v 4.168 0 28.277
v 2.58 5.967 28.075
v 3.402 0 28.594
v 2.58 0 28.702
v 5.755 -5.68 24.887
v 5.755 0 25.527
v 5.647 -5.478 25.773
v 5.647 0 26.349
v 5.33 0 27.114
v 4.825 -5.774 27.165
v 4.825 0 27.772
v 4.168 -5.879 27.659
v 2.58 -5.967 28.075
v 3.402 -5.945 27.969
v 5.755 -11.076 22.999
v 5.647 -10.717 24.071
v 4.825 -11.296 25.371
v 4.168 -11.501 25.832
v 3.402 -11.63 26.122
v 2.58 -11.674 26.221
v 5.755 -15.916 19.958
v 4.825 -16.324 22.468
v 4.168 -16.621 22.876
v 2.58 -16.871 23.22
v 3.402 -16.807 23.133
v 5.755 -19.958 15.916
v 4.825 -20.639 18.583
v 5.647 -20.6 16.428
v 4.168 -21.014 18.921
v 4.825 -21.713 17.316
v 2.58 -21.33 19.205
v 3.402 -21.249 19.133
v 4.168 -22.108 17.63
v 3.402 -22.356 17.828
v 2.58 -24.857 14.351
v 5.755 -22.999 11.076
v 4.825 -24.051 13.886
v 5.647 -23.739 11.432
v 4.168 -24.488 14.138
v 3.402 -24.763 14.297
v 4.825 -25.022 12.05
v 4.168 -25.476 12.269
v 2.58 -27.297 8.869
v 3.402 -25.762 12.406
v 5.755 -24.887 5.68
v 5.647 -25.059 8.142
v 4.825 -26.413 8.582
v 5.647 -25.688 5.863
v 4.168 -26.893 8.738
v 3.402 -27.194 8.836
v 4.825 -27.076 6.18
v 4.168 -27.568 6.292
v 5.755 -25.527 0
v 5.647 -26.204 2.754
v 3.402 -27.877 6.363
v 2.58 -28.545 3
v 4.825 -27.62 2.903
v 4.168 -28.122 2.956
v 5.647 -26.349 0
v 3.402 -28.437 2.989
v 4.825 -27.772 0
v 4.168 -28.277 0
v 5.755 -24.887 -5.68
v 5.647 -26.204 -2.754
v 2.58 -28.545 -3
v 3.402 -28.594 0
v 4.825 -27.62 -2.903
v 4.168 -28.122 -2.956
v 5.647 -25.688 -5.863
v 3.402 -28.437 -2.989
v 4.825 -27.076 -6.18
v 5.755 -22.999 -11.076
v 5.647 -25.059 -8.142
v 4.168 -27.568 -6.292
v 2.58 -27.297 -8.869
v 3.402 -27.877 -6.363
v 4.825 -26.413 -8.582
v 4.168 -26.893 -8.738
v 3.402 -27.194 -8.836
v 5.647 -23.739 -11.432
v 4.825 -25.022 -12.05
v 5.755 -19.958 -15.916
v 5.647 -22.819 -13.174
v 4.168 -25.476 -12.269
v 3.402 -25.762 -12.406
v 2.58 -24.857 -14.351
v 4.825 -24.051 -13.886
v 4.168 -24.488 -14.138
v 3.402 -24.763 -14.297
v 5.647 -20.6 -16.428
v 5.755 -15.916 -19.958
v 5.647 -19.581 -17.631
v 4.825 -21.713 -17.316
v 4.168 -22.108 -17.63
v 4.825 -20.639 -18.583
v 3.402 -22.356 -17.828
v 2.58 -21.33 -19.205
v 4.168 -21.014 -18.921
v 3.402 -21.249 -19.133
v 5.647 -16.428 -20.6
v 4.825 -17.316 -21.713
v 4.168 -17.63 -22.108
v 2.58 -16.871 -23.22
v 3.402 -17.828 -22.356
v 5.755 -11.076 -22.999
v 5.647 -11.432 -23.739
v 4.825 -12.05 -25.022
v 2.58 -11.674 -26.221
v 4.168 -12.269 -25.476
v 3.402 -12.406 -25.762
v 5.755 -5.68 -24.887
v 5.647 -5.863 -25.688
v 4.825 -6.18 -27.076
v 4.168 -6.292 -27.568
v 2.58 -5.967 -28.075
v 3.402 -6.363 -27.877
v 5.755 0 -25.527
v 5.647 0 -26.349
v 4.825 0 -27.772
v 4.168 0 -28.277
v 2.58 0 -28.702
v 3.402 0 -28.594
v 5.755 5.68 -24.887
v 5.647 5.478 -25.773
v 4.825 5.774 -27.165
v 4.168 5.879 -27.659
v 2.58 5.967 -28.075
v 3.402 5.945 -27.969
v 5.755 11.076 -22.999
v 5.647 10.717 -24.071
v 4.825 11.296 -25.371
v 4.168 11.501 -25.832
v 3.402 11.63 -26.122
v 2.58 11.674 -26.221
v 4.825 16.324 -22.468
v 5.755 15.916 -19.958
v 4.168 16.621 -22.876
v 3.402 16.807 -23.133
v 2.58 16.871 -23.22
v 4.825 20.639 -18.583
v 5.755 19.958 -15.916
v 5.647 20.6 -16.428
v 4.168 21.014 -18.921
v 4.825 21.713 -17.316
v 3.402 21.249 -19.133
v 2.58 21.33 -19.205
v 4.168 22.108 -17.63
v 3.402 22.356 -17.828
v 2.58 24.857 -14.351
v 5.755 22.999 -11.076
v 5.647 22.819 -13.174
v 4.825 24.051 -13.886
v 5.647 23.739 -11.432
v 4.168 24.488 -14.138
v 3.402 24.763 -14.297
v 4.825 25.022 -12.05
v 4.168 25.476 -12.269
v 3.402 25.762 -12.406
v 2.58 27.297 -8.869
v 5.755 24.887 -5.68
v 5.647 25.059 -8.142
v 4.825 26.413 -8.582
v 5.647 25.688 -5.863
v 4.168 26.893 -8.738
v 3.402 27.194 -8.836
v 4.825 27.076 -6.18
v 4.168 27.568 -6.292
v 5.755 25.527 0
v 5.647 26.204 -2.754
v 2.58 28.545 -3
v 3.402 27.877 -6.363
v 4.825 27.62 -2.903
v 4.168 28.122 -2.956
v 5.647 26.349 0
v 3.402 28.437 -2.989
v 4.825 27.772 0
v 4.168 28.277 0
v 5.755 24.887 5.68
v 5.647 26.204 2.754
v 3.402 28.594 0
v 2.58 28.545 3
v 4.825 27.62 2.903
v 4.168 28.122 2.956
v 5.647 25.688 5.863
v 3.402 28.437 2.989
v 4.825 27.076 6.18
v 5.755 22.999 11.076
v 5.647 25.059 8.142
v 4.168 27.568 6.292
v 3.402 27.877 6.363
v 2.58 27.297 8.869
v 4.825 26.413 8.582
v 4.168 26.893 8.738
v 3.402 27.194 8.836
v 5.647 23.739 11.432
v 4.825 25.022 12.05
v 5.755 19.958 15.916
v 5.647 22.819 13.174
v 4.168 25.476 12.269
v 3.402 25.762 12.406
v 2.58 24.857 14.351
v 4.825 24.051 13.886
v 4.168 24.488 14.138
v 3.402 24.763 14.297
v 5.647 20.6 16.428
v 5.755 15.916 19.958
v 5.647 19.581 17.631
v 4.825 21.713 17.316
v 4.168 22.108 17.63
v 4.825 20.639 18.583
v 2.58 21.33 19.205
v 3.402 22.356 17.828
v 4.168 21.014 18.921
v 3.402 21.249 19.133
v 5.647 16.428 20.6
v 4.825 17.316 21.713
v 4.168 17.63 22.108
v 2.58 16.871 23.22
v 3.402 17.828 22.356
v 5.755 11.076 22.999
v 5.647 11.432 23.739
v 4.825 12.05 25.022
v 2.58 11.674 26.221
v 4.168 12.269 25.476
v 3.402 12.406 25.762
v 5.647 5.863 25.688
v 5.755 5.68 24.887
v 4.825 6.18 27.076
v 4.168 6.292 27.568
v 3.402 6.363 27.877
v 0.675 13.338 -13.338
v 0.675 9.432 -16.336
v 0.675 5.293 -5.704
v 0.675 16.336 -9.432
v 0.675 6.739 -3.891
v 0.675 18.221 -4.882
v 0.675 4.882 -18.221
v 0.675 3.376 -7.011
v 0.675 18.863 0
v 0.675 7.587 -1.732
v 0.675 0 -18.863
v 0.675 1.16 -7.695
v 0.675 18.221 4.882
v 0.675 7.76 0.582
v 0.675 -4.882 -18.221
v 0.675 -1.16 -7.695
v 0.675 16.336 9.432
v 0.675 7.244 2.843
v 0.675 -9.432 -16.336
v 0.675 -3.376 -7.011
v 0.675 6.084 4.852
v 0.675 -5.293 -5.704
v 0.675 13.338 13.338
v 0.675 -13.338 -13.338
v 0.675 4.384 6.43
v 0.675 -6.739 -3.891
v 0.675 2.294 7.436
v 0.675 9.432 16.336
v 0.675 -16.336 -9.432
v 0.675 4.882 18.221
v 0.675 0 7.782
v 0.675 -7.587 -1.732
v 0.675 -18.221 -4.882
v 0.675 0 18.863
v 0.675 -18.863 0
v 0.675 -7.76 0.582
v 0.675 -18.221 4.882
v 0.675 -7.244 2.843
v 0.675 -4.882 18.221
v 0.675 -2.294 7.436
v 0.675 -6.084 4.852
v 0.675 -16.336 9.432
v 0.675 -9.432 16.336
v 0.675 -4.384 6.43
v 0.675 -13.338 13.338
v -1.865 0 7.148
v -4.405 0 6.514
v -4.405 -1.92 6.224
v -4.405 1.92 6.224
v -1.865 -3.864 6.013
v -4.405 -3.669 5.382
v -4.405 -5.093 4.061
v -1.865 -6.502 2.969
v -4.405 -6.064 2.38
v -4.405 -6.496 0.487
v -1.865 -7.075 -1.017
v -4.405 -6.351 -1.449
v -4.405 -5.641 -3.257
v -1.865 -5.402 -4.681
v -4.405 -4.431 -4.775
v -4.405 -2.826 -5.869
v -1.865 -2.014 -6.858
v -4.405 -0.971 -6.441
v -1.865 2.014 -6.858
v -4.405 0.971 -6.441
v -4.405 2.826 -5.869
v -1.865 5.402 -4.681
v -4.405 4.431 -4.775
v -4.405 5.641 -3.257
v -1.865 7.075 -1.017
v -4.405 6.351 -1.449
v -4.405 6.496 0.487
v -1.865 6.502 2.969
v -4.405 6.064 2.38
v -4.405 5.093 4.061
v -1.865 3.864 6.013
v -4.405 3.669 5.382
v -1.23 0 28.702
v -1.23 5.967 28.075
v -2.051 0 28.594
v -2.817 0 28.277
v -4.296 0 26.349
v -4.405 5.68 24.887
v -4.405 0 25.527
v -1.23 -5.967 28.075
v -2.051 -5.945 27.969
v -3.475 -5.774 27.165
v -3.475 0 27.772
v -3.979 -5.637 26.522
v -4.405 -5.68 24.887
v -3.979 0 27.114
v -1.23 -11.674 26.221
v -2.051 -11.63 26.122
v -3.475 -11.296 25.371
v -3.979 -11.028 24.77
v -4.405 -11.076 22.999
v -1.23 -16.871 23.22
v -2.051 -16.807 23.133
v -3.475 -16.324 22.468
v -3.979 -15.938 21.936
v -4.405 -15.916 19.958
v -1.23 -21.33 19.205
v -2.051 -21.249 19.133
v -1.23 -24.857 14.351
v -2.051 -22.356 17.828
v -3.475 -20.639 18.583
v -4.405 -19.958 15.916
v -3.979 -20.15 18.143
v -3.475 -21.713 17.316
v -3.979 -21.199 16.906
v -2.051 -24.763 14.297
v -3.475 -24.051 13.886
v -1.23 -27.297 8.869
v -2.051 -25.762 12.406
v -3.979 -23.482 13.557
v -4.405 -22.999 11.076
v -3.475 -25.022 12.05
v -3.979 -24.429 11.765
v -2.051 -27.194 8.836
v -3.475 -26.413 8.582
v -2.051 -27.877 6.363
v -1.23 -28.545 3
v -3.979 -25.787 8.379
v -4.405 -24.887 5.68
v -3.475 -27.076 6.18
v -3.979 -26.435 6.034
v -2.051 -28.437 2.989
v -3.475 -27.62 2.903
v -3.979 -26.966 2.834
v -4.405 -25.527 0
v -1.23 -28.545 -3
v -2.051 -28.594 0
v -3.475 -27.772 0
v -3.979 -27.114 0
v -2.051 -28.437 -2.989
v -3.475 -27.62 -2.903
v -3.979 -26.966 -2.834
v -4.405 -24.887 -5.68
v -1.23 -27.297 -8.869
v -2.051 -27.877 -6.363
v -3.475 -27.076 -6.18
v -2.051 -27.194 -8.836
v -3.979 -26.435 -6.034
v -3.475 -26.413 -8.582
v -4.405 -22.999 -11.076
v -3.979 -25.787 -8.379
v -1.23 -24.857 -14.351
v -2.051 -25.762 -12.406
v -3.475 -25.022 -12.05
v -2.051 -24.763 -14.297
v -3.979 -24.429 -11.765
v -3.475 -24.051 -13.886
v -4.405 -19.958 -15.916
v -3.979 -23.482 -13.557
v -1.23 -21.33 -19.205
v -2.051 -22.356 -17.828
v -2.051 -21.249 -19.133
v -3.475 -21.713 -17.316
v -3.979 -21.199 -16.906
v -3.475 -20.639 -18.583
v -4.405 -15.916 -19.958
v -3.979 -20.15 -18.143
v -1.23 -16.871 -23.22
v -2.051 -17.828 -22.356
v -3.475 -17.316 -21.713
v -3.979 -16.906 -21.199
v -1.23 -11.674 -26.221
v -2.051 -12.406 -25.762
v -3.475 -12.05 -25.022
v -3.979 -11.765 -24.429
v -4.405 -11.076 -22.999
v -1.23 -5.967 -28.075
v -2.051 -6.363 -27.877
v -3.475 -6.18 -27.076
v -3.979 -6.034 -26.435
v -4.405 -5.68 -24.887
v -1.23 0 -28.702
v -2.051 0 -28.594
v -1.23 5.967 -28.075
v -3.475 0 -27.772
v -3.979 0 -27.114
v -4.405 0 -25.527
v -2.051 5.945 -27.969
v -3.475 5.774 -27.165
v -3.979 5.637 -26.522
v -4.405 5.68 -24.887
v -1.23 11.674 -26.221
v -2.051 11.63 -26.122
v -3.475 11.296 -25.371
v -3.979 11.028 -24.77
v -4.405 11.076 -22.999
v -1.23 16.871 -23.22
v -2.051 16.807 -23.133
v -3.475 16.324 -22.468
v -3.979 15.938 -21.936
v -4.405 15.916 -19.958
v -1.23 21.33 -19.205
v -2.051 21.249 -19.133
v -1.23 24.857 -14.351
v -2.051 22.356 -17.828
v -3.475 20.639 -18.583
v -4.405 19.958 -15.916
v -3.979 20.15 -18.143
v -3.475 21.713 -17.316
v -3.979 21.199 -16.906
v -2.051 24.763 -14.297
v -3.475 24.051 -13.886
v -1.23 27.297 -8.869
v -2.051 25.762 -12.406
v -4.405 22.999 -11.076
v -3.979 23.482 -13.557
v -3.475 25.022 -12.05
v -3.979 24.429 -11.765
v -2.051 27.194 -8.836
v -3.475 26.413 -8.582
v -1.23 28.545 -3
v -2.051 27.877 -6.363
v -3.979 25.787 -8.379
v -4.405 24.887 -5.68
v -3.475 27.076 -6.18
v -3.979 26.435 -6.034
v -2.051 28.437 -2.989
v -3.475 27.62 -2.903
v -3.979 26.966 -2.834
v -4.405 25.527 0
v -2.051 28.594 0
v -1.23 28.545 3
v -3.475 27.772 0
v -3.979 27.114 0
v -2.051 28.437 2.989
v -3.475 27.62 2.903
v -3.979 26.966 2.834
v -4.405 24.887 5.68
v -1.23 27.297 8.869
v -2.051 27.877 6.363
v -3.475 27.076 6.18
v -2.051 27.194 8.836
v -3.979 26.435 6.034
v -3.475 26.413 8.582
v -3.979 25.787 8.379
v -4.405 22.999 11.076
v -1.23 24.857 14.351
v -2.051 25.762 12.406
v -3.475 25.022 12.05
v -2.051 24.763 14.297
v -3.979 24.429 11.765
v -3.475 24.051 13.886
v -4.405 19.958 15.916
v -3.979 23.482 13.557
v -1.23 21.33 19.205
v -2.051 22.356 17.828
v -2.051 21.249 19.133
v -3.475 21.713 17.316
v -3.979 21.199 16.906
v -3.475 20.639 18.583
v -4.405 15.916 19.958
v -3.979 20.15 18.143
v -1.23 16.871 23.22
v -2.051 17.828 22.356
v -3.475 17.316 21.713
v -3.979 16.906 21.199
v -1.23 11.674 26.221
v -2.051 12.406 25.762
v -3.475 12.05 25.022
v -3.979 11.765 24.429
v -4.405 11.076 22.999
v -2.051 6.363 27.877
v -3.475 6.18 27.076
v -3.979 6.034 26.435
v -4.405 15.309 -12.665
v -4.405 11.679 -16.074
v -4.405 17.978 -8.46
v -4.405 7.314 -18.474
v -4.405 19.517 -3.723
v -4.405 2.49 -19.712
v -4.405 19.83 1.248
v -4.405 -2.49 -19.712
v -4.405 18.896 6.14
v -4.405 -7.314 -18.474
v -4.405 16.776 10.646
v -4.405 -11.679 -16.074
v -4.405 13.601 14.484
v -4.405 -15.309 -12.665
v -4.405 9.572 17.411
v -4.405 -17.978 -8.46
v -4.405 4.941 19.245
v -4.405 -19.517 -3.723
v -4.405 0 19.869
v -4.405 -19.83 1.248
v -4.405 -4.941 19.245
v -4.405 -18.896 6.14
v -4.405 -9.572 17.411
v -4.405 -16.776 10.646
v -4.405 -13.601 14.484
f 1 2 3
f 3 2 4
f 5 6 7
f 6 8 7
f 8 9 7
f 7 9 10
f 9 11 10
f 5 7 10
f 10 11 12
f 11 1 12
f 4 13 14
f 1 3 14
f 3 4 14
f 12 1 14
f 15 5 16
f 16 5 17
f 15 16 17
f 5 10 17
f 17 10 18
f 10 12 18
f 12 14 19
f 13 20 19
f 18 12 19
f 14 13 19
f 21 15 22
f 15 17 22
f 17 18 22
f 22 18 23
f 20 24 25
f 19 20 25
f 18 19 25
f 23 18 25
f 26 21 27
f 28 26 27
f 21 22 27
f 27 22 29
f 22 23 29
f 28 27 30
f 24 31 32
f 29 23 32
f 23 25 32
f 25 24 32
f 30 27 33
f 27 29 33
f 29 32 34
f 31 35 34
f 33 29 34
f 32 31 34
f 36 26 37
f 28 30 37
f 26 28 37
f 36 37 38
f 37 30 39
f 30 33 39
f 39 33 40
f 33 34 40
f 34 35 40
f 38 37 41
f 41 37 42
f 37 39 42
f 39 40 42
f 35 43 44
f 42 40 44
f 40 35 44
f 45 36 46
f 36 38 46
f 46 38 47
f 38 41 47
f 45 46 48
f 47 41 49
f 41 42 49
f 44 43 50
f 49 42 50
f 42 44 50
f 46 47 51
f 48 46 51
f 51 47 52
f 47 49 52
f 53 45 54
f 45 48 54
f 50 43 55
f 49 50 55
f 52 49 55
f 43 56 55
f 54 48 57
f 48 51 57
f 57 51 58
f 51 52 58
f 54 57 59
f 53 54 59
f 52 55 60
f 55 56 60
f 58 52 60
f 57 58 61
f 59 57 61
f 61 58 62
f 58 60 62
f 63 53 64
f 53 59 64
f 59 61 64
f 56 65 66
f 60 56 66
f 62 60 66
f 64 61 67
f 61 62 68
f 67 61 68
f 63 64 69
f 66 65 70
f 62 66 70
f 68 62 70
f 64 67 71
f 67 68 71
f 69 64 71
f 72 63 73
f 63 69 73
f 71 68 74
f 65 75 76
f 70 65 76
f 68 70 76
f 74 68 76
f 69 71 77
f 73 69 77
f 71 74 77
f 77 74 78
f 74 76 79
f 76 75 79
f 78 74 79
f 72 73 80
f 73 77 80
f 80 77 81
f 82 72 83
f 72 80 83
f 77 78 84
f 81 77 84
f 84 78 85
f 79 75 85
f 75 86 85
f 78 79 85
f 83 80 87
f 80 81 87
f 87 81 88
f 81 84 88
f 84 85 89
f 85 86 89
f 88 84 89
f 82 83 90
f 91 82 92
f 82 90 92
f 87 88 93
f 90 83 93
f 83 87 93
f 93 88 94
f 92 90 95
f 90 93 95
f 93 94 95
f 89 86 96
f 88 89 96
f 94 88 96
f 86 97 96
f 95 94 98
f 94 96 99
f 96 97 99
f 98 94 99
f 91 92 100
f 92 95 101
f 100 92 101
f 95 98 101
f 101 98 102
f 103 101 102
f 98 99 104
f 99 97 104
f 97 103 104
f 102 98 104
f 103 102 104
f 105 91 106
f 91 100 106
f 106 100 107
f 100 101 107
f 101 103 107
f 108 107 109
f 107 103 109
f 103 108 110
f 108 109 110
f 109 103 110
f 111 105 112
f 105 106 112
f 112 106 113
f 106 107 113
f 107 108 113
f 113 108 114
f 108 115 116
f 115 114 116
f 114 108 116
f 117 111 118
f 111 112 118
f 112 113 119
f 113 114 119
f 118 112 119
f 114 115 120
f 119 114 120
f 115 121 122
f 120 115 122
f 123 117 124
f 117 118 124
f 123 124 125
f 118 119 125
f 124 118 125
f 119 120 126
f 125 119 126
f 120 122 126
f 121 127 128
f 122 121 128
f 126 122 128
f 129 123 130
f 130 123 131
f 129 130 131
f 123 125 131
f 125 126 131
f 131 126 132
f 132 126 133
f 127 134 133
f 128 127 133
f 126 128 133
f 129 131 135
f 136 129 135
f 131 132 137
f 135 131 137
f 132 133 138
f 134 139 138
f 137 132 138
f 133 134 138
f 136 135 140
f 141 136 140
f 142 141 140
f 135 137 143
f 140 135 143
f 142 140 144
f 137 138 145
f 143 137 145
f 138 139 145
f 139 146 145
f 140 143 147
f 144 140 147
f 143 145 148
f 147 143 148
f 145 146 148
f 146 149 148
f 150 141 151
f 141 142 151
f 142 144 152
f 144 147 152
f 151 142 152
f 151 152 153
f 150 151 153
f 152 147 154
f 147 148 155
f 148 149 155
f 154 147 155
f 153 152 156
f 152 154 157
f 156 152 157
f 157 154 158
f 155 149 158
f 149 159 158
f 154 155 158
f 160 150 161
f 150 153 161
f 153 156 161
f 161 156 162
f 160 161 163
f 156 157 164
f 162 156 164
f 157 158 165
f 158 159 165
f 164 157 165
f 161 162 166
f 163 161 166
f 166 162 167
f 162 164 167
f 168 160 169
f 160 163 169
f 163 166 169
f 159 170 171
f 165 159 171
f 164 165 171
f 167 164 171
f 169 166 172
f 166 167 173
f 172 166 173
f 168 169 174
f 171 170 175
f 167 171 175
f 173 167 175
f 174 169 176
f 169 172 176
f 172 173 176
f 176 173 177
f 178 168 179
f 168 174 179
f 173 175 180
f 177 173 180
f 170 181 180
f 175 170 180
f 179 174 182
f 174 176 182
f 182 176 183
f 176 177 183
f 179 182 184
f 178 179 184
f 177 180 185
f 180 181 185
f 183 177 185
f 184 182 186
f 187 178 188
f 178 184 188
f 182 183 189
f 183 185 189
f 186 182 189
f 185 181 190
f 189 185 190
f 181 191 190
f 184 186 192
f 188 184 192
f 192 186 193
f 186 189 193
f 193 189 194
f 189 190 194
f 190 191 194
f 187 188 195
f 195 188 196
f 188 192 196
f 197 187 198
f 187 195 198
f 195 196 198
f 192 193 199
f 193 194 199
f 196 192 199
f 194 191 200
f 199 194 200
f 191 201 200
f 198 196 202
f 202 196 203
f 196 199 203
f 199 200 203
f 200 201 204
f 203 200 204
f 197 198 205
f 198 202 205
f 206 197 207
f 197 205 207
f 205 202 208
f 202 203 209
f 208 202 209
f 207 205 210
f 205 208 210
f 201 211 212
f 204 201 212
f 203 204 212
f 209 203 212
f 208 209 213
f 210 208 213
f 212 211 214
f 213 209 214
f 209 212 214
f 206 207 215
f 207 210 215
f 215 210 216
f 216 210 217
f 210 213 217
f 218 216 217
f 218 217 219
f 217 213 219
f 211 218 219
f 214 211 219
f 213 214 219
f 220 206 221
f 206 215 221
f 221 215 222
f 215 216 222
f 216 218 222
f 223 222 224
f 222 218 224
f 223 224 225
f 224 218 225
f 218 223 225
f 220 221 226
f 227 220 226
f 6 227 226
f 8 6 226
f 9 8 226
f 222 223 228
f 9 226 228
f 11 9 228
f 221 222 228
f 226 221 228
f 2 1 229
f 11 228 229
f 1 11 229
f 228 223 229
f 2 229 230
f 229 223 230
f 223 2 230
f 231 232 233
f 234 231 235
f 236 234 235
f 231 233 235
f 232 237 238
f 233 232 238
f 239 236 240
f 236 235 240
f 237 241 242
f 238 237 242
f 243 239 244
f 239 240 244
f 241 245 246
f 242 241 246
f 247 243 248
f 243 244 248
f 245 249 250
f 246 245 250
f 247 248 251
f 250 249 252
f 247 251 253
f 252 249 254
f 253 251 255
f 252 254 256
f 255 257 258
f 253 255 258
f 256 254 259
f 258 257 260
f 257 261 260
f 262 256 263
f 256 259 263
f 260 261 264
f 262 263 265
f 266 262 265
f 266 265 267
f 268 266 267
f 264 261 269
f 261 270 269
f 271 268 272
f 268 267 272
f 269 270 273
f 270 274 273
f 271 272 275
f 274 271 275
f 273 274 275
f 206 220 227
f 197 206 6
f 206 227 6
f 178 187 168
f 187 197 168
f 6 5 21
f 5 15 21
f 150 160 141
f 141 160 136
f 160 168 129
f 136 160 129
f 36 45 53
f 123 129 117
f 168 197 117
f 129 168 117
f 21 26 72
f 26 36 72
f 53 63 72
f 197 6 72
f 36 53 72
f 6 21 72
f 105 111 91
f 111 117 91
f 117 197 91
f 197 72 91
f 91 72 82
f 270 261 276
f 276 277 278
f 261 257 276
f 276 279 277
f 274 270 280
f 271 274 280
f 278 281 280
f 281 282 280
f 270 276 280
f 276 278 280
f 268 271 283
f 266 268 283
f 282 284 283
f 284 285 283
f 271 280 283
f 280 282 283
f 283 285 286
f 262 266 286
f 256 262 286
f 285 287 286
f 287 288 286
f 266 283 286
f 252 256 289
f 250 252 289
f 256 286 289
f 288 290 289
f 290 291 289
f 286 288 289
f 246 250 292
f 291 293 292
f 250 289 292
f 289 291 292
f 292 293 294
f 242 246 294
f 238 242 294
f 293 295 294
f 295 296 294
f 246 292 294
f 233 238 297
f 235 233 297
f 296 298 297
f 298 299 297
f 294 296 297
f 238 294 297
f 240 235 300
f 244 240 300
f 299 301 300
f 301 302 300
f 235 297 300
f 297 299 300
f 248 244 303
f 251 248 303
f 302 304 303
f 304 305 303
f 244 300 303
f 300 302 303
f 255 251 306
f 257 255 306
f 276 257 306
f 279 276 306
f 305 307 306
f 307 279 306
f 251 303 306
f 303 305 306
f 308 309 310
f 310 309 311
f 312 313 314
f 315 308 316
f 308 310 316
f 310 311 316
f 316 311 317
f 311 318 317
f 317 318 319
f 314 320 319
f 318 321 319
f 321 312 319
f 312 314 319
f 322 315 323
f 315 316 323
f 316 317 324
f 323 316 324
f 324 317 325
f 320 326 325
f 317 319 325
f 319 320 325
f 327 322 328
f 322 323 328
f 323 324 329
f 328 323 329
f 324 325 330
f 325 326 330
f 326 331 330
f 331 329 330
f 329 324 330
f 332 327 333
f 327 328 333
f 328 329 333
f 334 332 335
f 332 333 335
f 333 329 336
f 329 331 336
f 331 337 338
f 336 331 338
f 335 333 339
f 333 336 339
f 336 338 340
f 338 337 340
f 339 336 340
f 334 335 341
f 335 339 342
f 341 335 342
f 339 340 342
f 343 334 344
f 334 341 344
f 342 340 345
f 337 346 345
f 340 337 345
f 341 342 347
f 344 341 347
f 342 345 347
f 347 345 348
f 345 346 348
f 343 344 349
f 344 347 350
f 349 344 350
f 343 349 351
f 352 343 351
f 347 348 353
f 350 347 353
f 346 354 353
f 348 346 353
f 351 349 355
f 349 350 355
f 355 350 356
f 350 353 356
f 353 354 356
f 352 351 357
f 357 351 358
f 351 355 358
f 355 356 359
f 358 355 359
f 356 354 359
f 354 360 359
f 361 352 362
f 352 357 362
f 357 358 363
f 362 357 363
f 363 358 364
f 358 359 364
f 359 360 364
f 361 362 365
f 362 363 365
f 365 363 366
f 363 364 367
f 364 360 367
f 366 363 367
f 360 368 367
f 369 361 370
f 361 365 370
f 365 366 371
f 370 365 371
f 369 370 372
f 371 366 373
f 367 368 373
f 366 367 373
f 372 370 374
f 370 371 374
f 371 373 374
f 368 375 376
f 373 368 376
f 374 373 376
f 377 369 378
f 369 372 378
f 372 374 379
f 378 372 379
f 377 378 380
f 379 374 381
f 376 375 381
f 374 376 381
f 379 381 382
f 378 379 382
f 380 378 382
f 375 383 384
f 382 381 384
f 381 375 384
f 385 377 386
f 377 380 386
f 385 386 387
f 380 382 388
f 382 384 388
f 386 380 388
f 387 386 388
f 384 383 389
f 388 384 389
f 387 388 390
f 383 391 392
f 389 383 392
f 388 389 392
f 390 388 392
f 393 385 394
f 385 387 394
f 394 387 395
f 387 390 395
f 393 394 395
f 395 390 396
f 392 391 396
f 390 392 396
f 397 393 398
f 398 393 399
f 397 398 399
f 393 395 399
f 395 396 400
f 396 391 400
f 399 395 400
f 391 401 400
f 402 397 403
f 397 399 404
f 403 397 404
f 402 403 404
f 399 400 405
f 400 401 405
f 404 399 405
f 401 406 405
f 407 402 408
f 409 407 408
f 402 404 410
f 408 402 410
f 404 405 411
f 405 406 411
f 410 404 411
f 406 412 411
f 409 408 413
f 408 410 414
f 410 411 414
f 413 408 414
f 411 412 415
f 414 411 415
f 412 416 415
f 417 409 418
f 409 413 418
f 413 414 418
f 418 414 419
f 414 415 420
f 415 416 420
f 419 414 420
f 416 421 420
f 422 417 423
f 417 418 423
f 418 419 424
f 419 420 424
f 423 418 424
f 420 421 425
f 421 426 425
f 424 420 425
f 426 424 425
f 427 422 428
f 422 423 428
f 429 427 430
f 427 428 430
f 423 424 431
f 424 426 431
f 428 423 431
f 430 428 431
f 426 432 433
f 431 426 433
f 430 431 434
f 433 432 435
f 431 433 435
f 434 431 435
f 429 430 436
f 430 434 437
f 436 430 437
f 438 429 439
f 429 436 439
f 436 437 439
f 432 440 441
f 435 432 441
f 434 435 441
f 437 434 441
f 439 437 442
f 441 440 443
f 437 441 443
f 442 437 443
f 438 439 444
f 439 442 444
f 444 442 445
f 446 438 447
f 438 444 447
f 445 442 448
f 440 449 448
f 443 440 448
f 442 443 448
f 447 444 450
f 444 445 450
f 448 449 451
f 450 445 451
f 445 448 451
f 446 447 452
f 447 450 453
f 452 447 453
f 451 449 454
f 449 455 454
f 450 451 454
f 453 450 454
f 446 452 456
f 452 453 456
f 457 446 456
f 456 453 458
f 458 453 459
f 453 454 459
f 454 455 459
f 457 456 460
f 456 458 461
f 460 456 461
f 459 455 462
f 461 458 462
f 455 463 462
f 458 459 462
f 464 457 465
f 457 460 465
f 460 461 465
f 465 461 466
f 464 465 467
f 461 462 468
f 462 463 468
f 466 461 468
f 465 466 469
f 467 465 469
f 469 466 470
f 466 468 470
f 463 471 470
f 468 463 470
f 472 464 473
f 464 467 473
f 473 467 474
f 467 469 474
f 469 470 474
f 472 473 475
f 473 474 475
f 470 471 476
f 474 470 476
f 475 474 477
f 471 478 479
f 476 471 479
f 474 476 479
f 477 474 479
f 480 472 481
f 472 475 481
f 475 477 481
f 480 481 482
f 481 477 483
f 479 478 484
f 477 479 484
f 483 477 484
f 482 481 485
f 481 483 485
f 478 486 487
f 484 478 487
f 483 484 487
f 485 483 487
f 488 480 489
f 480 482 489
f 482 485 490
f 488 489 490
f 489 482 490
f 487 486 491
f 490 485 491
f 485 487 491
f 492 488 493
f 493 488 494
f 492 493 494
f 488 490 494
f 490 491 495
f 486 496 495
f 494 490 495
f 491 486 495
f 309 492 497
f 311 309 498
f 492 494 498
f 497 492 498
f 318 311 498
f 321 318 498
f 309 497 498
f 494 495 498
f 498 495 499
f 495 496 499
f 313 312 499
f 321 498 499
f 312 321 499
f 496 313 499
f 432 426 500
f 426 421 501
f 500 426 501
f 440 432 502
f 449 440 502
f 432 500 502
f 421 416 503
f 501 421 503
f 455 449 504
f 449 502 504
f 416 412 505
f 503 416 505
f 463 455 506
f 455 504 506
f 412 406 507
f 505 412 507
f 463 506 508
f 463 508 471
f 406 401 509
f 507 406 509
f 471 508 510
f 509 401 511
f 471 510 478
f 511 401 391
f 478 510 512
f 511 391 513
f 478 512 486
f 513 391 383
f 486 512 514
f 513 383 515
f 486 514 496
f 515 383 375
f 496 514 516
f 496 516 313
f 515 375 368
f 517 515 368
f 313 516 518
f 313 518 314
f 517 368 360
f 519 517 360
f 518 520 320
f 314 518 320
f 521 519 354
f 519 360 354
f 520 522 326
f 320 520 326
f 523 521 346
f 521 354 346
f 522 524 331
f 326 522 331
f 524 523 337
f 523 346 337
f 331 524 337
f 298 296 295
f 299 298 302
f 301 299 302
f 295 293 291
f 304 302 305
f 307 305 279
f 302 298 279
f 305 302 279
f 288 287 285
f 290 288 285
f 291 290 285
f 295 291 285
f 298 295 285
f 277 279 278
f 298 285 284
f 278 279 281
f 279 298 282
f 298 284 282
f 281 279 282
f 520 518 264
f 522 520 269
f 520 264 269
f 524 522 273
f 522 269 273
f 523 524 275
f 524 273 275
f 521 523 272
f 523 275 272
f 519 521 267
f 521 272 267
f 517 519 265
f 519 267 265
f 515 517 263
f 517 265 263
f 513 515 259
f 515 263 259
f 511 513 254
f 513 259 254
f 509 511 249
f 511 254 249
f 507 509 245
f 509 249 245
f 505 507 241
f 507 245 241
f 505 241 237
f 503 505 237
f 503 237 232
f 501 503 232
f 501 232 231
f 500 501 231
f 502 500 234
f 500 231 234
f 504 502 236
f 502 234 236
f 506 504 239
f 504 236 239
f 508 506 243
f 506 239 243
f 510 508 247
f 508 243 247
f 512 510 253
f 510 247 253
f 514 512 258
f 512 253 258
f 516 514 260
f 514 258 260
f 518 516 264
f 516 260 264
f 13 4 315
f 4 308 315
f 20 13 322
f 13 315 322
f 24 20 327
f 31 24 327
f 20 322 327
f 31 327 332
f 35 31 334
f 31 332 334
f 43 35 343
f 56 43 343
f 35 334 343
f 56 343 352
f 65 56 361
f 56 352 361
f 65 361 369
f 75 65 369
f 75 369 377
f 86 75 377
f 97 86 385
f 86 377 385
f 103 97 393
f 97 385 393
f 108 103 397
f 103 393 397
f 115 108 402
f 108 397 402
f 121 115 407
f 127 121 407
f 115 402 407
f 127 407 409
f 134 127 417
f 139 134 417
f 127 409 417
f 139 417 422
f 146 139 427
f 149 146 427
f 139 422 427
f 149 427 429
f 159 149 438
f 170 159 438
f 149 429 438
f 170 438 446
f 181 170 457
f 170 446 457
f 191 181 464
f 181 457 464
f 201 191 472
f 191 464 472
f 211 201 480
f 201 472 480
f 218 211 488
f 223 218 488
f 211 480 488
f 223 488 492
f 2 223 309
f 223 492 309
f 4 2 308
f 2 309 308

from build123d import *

# Parameters (mm, degrees)
F0_W = 5.08
F0_H = 6.604


with BuildPart() as f1:
    # F0 (on Front) → F1 (revolve)
    with BuildSketch(Plane.XZ):
        with Locations((3.215322, 12.7)):
            Rectangle(F0_W, F0_H)
        with BuildLine():
            Line((-4.404678, 25.527), (-4.404678, 19.868769))
            Line((-4.404678, 19.868769), (0.675322, 18.863278))
            Line((0.675322, 18.863278), (0.675322, 16.002))
            Line((0.675322, 16.002), (5.755322, 16.002))
            Line((5.755322, 16.002), (5.755322, 25.527))
            ThreePointArc((5.755322, 25.527), (4.825386, 27.772064), (2.580322, 28.702))
            Line((2.580322, 28.702), (-1.229678, 28.702))
            ThreePointArc((-1.229678, 28.702), (-3.474742, 27.772064), (-4.404678, 25.527))
        make_face()
        Polygon((-4.404678, 6.513816), (-4.404678, 0), (5.755322, 0), (5.755322, 9.398), (0.675322, 9.398), (0.675322, 7.781735), align=None)
    revolve(axis=Axis((0.675322, 0, 0), (1, 0, 0)))


solid = f1.part
